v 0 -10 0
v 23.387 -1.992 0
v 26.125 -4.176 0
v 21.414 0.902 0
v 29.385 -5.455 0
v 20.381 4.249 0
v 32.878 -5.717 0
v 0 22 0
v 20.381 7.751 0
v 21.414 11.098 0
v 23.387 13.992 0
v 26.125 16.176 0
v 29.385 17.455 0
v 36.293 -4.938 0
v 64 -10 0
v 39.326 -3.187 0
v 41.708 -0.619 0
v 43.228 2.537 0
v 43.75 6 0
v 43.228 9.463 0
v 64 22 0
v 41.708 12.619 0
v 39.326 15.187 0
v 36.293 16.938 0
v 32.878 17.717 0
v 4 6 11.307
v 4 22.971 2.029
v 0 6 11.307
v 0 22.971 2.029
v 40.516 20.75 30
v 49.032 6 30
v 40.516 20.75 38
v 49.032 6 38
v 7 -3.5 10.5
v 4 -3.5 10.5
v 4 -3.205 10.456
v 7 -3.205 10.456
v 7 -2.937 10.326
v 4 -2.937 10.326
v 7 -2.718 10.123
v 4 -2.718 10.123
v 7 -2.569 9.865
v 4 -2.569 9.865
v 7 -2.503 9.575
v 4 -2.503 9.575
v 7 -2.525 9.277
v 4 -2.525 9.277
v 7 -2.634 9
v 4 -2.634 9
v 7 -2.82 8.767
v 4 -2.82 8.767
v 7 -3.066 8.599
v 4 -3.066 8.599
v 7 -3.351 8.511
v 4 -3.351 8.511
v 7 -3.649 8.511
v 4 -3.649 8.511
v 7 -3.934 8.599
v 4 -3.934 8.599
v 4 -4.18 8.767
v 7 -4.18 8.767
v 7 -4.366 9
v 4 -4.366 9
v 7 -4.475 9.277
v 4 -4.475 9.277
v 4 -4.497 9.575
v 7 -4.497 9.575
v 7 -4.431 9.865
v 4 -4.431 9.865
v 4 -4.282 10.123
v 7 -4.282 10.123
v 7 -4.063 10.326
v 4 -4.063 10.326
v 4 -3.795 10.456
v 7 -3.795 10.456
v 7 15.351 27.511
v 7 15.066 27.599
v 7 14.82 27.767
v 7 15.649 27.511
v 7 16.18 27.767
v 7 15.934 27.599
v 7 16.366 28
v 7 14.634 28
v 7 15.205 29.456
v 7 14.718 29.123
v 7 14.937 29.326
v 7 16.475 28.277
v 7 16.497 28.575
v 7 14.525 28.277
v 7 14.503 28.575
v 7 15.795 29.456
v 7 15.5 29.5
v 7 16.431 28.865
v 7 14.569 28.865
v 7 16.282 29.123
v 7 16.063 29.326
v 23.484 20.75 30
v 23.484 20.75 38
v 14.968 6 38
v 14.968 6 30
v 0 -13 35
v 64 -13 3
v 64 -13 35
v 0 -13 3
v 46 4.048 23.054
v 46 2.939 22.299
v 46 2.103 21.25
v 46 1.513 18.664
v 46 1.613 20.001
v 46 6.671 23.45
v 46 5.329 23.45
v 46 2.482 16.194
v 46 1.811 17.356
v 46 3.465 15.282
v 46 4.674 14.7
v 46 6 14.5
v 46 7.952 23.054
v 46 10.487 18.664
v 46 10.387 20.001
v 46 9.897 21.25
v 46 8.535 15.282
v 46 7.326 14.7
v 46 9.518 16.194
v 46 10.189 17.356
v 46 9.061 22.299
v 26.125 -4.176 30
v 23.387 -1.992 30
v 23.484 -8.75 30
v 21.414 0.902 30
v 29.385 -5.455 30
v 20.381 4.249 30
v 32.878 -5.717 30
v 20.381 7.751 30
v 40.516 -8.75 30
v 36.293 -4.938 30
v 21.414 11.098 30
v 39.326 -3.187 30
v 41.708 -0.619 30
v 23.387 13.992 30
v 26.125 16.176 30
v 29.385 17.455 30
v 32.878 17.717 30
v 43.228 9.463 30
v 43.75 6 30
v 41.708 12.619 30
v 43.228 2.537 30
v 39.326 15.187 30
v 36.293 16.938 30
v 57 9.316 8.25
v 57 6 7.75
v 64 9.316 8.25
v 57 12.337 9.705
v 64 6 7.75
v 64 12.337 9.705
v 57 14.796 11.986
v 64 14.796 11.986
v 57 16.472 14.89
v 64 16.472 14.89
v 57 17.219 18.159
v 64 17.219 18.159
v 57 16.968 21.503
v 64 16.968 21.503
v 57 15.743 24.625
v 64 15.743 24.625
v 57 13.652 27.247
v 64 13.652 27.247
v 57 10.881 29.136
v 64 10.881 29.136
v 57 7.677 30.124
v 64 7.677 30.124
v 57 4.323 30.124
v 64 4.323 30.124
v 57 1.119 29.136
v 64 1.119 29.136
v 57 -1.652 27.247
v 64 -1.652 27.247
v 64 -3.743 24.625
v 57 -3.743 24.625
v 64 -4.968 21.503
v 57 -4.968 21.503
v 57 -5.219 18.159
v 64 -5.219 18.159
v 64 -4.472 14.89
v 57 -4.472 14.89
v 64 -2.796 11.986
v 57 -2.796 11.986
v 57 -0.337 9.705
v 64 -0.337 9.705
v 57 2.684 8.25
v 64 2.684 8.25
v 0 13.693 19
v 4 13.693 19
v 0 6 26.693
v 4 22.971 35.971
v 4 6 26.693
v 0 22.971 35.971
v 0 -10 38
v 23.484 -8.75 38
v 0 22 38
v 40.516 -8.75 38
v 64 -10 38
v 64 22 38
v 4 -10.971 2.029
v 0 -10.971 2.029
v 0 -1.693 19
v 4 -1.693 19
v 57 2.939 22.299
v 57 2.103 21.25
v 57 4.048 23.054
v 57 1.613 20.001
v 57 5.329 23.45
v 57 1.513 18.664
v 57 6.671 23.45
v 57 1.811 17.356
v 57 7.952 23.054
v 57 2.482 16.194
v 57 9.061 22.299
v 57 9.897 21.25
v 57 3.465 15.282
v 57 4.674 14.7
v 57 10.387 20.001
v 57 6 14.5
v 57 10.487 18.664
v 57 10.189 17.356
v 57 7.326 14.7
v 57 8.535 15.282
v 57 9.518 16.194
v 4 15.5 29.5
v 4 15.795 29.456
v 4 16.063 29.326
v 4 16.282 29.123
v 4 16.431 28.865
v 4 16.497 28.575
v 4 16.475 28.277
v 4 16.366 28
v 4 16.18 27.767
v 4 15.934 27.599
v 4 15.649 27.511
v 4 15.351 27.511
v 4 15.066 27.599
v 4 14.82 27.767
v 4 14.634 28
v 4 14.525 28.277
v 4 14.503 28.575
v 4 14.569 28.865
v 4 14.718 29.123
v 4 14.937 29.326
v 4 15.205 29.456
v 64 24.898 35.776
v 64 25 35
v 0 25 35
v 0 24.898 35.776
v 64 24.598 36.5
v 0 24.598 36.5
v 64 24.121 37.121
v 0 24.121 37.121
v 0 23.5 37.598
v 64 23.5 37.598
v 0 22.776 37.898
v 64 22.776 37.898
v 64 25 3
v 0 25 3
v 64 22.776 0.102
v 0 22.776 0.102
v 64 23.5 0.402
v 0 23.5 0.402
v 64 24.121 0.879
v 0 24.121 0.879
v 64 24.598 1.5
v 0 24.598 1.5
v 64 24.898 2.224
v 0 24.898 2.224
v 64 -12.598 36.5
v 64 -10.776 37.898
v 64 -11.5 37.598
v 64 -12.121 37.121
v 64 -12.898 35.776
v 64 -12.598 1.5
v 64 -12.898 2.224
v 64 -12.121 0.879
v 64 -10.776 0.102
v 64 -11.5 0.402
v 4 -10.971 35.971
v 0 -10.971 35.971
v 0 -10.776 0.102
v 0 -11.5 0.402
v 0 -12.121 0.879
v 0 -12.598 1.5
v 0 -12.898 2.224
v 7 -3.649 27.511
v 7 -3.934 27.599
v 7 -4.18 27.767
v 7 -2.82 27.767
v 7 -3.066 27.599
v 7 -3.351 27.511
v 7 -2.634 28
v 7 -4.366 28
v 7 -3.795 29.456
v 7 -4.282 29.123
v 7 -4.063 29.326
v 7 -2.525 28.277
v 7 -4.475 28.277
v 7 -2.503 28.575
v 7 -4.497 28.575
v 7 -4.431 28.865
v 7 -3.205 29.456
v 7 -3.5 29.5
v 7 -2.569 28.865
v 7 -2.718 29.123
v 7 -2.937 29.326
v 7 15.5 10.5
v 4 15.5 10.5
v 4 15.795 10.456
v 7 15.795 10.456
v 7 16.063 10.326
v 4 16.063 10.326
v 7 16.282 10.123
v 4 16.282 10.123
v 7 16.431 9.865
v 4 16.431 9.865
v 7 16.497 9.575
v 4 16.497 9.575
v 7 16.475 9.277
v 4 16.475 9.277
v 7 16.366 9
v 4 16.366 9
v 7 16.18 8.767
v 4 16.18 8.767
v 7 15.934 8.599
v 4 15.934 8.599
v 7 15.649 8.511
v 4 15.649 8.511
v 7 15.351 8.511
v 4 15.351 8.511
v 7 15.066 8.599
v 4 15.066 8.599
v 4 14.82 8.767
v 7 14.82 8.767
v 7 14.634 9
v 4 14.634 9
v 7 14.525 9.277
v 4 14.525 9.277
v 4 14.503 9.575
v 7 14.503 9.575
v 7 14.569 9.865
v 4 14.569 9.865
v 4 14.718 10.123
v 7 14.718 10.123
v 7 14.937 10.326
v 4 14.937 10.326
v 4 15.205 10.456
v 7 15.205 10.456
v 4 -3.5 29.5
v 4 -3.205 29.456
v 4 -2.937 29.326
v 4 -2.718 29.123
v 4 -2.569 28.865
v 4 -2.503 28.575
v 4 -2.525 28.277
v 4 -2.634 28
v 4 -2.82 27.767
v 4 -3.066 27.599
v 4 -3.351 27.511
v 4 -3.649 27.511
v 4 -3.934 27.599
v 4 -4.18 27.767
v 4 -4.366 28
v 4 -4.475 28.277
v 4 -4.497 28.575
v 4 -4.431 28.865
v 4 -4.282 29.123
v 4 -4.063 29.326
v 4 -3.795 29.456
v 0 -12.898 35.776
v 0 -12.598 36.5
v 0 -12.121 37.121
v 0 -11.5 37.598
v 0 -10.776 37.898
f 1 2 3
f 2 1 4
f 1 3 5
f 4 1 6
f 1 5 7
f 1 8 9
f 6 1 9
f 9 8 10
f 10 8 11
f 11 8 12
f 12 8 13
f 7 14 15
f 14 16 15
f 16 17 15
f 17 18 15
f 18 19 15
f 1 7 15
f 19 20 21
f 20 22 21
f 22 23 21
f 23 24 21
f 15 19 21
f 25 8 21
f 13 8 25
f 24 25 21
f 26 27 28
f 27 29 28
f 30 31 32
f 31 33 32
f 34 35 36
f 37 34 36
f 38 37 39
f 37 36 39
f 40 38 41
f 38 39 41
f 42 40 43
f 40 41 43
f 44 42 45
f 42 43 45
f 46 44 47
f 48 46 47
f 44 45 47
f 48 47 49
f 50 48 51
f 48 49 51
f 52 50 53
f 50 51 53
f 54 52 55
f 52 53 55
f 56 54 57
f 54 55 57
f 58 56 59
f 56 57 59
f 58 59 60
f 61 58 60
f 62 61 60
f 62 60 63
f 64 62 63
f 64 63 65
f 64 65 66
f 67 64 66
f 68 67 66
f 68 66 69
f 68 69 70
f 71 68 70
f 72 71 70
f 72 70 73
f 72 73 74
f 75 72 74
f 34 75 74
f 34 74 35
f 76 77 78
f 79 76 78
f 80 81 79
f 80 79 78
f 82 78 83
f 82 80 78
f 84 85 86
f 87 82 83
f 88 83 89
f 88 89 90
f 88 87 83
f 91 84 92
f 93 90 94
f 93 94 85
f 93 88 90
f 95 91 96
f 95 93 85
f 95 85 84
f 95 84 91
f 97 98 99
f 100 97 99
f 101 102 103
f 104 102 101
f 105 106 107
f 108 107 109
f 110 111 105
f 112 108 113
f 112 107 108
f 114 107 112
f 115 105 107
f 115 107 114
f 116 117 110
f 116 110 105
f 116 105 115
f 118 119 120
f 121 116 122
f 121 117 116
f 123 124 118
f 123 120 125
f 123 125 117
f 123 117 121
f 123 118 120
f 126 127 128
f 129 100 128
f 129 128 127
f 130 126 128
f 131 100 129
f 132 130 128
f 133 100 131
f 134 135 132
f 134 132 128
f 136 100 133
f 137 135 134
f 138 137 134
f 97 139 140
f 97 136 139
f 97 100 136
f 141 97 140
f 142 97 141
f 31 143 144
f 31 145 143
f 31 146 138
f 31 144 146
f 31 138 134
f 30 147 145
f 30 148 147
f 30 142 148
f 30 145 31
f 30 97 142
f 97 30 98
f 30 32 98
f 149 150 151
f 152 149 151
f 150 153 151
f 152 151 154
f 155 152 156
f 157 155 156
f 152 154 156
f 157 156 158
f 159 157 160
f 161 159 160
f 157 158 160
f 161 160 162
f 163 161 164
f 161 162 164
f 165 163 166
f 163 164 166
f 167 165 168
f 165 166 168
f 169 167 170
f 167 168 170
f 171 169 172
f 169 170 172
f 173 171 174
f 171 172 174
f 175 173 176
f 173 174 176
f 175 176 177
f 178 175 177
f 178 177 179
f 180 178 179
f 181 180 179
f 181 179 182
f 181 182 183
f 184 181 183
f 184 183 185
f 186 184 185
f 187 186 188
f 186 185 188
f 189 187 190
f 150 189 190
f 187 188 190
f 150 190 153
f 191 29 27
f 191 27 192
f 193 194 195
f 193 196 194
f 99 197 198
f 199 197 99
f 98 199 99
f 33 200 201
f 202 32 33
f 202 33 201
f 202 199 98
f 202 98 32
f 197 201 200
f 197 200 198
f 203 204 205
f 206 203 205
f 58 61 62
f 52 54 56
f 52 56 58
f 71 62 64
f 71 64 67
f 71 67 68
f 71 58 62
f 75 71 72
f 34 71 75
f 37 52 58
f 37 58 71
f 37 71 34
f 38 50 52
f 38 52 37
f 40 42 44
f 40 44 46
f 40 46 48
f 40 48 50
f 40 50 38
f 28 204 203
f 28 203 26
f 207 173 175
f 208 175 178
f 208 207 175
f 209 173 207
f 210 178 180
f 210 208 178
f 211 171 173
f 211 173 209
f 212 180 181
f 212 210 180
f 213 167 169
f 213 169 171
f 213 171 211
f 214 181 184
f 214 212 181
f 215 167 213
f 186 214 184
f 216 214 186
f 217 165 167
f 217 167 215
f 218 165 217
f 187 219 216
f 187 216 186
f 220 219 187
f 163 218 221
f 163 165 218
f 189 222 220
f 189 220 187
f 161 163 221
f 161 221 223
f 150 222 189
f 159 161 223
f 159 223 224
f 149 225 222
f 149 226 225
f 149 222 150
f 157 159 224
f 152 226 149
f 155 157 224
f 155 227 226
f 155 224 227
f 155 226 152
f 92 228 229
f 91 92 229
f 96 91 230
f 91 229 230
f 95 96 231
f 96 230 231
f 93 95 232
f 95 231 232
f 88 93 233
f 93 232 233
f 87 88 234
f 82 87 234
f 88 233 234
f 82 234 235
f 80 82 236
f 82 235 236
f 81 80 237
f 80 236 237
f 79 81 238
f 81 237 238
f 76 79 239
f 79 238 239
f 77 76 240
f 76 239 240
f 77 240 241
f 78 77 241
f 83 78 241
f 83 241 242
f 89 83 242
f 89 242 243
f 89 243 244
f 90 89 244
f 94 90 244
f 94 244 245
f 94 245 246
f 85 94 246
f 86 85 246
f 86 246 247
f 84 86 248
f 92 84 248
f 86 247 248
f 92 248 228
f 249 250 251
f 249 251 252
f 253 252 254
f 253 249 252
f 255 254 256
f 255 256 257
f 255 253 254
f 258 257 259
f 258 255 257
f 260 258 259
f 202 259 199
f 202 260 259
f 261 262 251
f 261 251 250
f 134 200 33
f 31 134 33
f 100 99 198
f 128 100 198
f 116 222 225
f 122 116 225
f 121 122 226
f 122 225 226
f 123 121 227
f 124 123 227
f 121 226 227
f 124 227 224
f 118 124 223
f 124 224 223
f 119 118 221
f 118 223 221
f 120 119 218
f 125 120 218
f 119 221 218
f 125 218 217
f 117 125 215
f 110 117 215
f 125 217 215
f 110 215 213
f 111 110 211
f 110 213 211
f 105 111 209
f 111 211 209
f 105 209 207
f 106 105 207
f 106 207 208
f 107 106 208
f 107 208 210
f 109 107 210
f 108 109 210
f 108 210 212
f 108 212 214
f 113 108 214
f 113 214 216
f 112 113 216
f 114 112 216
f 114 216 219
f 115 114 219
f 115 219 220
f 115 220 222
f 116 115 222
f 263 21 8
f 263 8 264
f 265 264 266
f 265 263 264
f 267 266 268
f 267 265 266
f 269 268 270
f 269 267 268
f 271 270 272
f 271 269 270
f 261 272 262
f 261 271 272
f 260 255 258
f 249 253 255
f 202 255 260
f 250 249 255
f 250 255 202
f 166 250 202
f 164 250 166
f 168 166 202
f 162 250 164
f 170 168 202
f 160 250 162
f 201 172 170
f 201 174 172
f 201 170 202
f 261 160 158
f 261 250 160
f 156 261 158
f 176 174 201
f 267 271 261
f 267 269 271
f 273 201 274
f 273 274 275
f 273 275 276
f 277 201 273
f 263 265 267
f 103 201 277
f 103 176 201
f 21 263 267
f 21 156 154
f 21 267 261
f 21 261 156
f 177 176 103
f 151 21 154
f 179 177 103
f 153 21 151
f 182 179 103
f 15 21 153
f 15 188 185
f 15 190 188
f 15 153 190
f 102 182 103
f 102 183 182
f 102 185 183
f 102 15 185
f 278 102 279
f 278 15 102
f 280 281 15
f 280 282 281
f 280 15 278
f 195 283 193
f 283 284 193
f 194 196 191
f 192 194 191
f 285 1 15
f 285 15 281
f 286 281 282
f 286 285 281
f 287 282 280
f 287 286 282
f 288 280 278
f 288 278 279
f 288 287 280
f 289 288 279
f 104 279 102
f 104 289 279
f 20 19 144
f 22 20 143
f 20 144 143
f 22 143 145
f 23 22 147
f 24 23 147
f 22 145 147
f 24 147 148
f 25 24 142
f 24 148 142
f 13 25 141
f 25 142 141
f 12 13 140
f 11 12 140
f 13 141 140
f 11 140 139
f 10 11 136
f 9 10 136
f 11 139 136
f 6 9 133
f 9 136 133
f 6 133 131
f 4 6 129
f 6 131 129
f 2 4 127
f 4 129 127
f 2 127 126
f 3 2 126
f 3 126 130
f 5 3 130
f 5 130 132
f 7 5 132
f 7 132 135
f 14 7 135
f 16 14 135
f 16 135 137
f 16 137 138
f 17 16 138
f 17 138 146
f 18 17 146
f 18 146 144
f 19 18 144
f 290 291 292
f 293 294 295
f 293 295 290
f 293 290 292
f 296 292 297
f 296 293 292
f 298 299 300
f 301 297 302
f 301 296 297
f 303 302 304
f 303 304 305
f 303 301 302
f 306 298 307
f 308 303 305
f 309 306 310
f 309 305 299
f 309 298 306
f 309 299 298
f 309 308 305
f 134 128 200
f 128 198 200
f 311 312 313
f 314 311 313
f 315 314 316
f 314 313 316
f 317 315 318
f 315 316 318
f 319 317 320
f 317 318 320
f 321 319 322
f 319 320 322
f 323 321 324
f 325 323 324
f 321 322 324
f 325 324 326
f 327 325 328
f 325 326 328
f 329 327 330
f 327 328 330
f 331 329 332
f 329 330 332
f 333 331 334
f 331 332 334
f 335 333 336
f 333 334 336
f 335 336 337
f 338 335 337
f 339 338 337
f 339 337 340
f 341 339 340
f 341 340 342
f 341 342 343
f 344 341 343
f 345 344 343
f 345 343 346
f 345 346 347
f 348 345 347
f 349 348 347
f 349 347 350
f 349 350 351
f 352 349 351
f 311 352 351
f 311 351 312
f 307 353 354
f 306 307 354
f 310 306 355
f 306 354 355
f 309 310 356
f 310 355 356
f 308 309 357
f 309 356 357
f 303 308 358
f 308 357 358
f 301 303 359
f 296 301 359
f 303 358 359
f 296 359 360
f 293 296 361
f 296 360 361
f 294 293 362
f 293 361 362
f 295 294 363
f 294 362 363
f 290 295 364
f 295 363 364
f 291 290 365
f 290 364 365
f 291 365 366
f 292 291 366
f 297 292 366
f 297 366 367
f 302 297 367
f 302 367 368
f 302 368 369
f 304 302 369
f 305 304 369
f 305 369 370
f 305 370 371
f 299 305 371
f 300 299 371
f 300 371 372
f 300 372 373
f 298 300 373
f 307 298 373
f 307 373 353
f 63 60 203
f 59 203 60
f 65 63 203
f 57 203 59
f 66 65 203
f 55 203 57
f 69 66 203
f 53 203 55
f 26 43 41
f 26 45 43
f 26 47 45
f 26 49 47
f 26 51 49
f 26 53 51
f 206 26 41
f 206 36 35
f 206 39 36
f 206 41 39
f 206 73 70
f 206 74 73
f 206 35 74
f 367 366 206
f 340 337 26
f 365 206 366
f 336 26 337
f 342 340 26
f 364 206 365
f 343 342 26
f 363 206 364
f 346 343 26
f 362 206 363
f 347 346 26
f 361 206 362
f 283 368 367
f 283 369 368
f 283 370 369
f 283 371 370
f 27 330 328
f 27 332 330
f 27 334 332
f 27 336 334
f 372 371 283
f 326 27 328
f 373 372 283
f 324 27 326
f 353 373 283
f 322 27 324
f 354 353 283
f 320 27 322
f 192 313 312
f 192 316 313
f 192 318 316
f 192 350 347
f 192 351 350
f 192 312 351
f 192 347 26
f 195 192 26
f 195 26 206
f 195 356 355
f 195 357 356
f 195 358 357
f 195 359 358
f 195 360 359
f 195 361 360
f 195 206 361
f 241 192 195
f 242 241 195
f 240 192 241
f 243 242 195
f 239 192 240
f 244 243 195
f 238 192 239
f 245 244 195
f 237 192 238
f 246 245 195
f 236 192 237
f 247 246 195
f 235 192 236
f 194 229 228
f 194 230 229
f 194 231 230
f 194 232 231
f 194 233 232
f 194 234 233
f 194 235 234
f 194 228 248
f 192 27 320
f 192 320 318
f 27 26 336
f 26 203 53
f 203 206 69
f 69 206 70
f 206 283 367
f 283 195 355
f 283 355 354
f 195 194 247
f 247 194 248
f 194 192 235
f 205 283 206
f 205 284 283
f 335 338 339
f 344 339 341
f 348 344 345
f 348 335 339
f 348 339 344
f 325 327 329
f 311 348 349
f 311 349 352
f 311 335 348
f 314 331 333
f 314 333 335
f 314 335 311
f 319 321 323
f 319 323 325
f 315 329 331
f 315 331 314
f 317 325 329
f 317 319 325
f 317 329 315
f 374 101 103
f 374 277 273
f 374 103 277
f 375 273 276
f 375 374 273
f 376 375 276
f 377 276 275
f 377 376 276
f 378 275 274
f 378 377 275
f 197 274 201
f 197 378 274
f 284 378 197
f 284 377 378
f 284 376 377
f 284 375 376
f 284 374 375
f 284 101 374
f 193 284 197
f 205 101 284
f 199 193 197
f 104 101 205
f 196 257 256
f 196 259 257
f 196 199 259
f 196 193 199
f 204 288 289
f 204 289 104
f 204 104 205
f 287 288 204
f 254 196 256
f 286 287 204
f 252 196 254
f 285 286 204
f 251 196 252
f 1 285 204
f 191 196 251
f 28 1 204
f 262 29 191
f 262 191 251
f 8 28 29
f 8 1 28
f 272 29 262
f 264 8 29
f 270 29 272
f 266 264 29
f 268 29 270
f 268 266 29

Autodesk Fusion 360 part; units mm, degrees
sketch "Sketch1" plane through (0, 0, 0) normal (0, 0, 1) x (1, 0, 0)
  line L0 (0, 25) -> (64, 25)
  line L1 (64, 25) -> (64, -13)
  line L2 (64, -13) -> (0, -13)
  line L3 (0, -13) -> (0, 25)
  dimension "d1" = 64
  dimension "d2" = 38
extrude "Extrude1" add sketch "Sketch1" along normal blind 38
sketch "Sketch2" plane through (0, 0, 38) normal (0, 0, 1) x (1, 0, 0)
  line L0 (0, -13) -> (64, -13)
  line L1 (64, -13) -> (64, 25)
  line L2 (64, 25) -> (0, 25)
  line L3 (0, 25) -> (0, -13)
  line L4 (0, 25) -> (64, -13) construction
  line L5 (40.5159, 20.75) -> (23.4841, 20.75)
  line L6 (23.4841, 20.75) -> (14.9682, 6)
  line L7 (14.9682, 6) -> (23.4841, -8.75)
  line L8 (23.4841, -8.75) -> (40.5159, -8.75)
  line L9 (40.5159, -8.75) -> (49.0318, 6)
  line L10 (49.0318, 6) -> (40.5159, 20.75)
  circle A0 centre (32, 6) radius 11.75
  point P0 (32, 6)
  point P1 (32, 6)
  dimension "d5" = 14.75
  dimension "d8" = 23.5
extrude "Extrude2" cut sketch "Sketch2" against normal blind 8 contours L5 L6 L7 L8 L9 L10 | A0
extrude "Extrude3" cut sketch "Sketch2" against normal blind 52 contours A0
sketch "Sketch4" plane through (0, 0, 0) normal (-1, 0, 0) x (0, 0, 1)
  line L0 (0, 25) -> (0, -13)
  line L1 (0, -13) -> (38, -13)
  line L2 (38, -13) -> (38, 25)
  line L3 (38, 25) -> (0, 25)
  circle A0 centre (19, 6) radius 6.75 construction
  line L4 (2.0294, 22.9706) -> (35.9706, -10.9706) construction
  line L5 (19, 25) -> (19, -13) construction
  line L6 (2.0294, -10.9706) -> (35.9706, 22.9706) construction
  line L7 (2.0294, 22.9706) -> (11.3071, 6)
  line L8 (2.0294, 22.9706) -> (19, 13.6929)
  line L9 (35.9706, 22.9706) -> (19, 13.6929)
  line L10 (35.9706, 22.9706) -> (26.6929, 6)
  line L11 (35.9706, -10.9706) -> (26.6929, 6)
  line L12 (35.9706, -10.9706) -> (19, -1.6929)
  line L13 (2.0294, -10.9706) -> (19, -1.6929)
  line L14 (2.0294, -10.9706) -> (11.3071, 6)
  line L15 (19, 6) -> (2.0294, 22.9706) construction
  line L16 (8.5702, 16.4298) -> (10.5147, 18.3317) construction
  line L17 (9.5, 15.5) -> (11.6895, 17.6895) construction
  line L18 (11.3986, 13.6014) -> (14.1445, 16.3473) construction
  line L19 (12.8128, 12.1872) -> (15.9732, 15.3476) construction
  line L20 (9.5, 15.5) -> (28.5, 15.5) construction
  line L21 (28.5, 15.5) -> (28.5, -3.5) construction
  line L22 (28.5, -3.5) -> (9.5, -3.5) construction
  line L23 (9.5, -3.5) -> (9.5, 15.5) construction
  line L24 (28.5, 15.5) -> (9.5, -3.5) construction
  circle A1 centre (9.5, 15.5) radius 1
  circle A2 centre (28.5, 15.5) radius 1
  circle A3 centre (28.5, -3.5) radius 1
  circle A4 centre (9.5, -3.5) radius 1
  point P0 (19, 6)
  point P1 (12.8128, 12.1872)
  point P2 (11.3986, 13.6014)
  point P3 (9.5, 15.5)
  point P4 (8.5702, 16.4298)
  point P5 (14.227, 10.773)
  point P6 (28.5, 15.5)
  point P7 (9.5, -3.5)
  point P8 (28.5, -3.5)
  dimension "d11" = 13.5
  dimension "d12" = 48
  dimension "d13" = 48
  dimension "d33" = 19
  dimension "d34" = -19
  dimension "d35" = 2
  dimension "d36" = 2
  dimension "d37" = 2
  dimension "d38" = 2
extrude "Extrude4" cut sketch "Sketch4" against normal blind 3 contours L7 L8 L9 L10 L11 L12 L13 L14 | A1 | A2 | A3 | A4
fillet "Fillet1" radius 3 2 edges at (32, 25, 0) (32, -13, 0)
fillet "Fillet2" radius 3 2 edges at (32, 25, 38) (32, -13, 38)
sketch "Sketch5" plane through (64, 0, 0) normal (1, 0, 0) x (0, 0, -1)
  arc A0 (-38, -10) -> (-35, -13) centre (-35, -10) ccw
  line L0 (-35, -13) -> (-3, -13)
  arc A1 (-3, -13) -> (0, -10) centre (-3, -10) ccw
  line L1 (0, -10) -> (0, 22)
  arc A2 (0, 22) -> (-3, 25) centre (-3, 22) ccw
  line L2 (-3, 25) -> (-35, 25)
  arc A3 (-35, 25) -> (-38, 22) centre (-35, 22) ccw
  line L3 (-38, 22) -> (-38, -10)
  circle A4 centre (-19, 6) radius 11.25
  circle A5 centre (-19, 6) radius 4.5
  point P0 (-19, 25)
  point P1 (-19, -13)
  point P2 (-38, 6)
  point P3 (0, 6)
  point P4 (-19, 6)
  dimension "d20" = 22.5
  dimension "d21" = 9
extrude "Extrude5" cut sketch "Sketch5" against normal blind 18 contours A5
extrude "Extrude6" cut sketch "Sketch5" against normal blind 7 contours A4
extrude "Extrude7" cut sketch "Sketch4" against normal blind 4 contours L7 L8 L9 L10 L11 L12 L13 L14 | A1 | A2 | A3 | A4
extrude "Extrude8" cut sketch "Sketch4" against normal blind 7 contours A1 | A2 | A3 | A4
